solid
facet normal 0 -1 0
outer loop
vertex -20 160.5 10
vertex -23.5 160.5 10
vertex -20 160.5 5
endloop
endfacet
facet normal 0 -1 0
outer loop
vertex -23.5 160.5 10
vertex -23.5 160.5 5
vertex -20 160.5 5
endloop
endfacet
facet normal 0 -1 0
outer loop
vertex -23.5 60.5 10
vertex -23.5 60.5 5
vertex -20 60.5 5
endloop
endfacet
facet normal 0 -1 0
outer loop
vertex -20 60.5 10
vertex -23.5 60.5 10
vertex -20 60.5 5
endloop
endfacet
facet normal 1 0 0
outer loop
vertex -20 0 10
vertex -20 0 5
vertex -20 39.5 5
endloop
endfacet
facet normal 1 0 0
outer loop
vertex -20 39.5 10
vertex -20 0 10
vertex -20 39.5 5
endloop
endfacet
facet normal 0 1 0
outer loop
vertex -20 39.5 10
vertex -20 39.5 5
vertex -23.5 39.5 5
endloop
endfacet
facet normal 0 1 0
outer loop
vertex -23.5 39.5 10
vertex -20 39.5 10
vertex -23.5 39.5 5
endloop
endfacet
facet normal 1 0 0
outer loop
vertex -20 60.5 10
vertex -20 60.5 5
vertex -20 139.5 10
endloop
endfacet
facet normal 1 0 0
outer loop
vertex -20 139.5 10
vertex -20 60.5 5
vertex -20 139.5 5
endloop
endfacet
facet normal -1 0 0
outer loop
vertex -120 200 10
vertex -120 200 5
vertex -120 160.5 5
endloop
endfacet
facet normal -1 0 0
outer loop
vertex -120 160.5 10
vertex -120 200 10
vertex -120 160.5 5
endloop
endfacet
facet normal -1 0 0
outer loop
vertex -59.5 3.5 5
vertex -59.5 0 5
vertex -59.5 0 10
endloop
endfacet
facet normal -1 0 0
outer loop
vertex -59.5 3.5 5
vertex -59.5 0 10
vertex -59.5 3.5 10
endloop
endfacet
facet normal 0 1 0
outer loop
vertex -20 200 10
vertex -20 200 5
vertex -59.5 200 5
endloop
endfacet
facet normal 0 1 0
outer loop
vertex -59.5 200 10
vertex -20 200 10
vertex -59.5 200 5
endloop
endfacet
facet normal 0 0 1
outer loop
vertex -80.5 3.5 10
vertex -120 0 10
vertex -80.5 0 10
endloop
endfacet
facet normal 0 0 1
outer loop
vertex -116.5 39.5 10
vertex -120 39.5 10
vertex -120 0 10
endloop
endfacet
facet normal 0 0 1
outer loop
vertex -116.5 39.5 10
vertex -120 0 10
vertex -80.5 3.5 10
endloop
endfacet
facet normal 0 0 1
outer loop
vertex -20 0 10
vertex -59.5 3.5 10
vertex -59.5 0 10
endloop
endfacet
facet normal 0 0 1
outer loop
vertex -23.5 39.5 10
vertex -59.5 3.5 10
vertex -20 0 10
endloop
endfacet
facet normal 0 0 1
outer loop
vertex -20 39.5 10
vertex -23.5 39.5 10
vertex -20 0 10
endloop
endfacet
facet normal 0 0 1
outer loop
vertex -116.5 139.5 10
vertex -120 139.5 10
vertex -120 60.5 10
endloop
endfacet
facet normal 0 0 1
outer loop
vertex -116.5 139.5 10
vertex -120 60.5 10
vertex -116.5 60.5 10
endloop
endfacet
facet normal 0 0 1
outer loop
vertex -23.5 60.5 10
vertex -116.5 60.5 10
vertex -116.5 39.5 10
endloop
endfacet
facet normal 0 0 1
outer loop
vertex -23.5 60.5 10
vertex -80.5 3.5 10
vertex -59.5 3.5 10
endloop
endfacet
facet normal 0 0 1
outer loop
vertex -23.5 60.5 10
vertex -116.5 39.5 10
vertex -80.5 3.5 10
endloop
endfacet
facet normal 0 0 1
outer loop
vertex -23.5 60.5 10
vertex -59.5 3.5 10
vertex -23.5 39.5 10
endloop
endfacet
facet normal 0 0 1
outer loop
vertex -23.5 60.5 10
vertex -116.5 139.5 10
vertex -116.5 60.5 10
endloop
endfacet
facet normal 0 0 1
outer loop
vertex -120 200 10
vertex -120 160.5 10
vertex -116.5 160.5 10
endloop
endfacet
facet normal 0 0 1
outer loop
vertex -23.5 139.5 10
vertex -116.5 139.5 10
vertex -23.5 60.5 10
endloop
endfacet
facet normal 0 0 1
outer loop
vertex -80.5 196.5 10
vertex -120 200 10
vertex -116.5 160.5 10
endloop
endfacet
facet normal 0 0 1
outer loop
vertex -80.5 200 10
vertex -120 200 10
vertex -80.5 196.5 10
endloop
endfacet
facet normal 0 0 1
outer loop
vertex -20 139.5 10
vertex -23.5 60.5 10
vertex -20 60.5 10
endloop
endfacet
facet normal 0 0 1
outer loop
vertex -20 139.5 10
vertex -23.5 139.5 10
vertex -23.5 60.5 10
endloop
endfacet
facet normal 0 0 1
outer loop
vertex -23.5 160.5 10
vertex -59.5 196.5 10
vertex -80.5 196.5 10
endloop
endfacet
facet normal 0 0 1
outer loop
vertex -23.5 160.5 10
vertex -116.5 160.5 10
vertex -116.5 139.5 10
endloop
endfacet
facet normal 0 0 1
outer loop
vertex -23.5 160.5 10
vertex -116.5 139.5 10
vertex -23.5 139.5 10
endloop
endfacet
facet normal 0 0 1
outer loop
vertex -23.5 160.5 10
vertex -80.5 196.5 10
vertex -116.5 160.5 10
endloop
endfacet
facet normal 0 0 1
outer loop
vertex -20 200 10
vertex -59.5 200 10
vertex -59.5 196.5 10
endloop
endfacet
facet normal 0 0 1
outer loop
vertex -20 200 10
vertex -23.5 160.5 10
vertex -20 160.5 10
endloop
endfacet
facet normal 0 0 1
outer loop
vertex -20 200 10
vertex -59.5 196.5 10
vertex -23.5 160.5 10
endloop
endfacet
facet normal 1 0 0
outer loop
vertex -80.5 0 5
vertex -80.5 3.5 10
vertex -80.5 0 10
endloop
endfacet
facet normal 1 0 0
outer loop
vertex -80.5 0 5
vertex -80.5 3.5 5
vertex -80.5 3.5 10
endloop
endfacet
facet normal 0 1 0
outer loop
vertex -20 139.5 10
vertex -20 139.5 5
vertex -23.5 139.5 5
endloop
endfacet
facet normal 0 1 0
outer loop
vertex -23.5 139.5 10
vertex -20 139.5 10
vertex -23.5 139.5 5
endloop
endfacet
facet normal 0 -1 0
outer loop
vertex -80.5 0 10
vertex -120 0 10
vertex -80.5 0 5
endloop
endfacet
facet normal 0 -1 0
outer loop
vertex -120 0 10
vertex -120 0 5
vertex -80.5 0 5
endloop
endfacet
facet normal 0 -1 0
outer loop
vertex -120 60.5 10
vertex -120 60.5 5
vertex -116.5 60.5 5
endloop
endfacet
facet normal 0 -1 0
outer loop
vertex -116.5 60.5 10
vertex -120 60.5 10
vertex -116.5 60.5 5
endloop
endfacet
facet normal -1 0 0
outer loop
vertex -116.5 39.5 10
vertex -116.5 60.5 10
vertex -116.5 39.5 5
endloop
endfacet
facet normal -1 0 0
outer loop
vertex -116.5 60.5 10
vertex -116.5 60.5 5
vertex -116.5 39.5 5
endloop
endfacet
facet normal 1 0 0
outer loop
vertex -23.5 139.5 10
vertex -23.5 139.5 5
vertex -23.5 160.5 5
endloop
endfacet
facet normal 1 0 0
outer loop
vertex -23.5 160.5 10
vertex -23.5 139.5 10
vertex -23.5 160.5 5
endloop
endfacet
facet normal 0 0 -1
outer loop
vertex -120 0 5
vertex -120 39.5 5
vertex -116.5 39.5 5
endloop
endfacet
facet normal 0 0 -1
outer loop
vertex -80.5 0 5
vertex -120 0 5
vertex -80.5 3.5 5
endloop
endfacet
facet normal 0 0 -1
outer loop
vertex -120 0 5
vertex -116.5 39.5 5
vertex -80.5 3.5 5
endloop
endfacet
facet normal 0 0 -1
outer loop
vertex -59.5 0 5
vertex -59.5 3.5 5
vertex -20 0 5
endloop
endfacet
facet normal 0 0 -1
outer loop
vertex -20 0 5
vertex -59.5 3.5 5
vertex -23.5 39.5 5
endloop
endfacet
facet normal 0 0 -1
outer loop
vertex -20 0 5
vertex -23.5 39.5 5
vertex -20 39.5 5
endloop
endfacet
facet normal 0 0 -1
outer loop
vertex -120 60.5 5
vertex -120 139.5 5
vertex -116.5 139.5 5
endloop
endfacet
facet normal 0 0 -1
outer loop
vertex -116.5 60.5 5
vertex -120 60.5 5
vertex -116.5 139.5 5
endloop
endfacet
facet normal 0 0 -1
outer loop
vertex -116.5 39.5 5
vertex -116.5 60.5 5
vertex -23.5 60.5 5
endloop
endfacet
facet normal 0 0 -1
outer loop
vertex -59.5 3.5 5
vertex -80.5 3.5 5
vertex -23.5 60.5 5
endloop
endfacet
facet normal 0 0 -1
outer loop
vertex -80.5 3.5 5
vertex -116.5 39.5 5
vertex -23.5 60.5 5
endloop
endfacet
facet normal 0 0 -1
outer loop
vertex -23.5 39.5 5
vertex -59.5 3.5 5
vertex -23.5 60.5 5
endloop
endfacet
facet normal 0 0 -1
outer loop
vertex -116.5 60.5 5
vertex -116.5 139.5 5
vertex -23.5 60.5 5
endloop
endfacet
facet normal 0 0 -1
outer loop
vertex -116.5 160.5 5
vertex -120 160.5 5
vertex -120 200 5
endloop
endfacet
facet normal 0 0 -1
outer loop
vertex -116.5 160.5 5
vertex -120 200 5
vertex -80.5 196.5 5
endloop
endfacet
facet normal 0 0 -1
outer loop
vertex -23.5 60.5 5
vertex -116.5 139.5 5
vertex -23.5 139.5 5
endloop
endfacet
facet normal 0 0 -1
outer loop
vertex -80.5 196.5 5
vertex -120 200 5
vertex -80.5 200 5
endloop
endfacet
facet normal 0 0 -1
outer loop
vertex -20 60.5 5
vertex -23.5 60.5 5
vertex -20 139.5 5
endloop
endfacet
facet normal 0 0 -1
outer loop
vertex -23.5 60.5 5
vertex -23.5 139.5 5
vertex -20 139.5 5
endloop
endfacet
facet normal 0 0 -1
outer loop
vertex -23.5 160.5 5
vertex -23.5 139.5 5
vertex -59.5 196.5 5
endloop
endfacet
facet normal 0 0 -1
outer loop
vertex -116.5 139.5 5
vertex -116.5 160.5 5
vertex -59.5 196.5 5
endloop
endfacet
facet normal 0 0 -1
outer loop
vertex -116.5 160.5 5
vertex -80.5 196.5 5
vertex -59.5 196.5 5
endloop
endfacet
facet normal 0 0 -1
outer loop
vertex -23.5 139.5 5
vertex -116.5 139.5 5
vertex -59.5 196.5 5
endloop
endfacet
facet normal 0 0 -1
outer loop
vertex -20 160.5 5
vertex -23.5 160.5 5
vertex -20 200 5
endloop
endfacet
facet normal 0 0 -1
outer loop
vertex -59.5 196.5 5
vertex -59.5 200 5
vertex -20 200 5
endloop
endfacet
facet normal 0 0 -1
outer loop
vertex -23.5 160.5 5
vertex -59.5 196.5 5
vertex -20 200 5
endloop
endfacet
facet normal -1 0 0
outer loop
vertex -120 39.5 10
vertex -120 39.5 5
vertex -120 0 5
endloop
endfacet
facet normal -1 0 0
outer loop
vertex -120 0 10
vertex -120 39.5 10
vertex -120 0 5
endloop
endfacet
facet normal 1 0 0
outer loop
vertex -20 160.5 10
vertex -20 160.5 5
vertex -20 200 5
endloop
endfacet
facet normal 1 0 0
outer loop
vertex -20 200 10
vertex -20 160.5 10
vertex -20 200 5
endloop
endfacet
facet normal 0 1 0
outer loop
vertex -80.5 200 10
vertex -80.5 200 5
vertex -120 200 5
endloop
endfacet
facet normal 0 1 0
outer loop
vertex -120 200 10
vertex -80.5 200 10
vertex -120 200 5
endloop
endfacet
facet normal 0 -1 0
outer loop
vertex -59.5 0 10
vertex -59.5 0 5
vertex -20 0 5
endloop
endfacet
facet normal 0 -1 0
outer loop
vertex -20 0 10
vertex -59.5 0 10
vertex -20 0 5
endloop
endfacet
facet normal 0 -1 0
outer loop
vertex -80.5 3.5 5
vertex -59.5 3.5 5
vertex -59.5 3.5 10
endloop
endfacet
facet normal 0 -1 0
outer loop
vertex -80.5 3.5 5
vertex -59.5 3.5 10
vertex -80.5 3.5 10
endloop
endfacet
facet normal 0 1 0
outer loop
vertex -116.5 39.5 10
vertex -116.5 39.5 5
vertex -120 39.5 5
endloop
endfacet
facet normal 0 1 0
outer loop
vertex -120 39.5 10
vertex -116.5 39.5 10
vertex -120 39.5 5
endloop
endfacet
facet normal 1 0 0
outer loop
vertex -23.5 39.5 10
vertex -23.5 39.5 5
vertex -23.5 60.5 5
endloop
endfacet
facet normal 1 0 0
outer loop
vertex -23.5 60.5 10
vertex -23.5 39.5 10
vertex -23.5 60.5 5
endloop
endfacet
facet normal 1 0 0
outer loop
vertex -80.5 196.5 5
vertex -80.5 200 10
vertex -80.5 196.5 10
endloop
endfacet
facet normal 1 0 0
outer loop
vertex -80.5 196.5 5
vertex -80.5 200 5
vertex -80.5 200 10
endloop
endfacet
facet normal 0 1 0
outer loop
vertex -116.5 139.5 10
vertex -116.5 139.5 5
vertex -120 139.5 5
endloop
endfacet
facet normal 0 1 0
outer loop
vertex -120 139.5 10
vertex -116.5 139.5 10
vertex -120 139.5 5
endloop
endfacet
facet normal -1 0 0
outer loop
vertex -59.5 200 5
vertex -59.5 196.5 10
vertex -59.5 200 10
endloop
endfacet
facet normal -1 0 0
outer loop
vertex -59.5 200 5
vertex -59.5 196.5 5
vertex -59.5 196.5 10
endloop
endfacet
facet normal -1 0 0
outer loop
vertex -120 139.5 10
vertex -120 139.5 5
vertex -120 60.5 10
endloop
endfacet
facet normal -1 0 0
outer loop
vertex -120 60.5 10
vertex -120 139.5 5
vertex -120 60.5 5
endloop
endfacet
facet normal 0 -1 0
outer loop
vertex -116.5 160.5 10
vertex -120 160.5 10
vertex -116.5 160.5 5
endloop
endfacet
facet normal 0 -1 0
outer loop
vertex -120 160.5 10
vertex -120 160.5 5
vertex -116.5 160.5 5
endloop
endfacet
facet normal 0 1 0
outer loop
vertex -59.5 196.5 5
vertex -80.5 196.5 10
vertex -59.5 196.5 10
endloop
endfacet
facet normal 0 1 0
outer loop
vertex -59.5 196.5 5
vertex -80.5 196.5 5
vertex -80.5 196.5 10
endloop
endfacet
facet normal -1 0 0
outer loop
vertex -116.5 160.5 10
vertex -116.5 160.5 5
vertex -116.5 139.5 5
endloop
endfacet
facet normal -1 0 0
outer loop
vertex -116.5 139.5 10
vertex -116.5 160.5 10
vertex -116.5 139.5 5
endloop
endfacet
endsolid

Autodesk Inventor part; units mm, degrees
ref_plane "YZ Plane" through (0, 0, 0) normal (1, 0, 0) x (0, 1, 0)
ref_plane "XZ Plane" through (0, 0, 0) normal (0, 1, 0) x (-1, 0, 0)
ref_plane "XY Plane" through (0, 0, 0) normal (0, 0, 1) x (1, 0, 0)
sketch "Skizze3" plane through (0, 0, 0) normal (0, 0, 1) x (1, 0, 0)
  line L0 (0, 0) -> (0, 200)
  line L1 (0, 200) -> (-20, 200)
  line L2 (-20, 200) -> (-20, 220)
  line L3 (-20, 220) -> (-120, 220)
  line L4 (-120, 220) -> (-120, 200)
  line L5 (-120, 200) -> (-140, 200)
  line L6 (-140, 200) -> (-140, 160)
  line L7 (-140, 160) -> (-120, 160)
  line L8 (-120, 160) -> (-120, 140)
  line L9 (-120, 140) -> (-140, 140)
  line L10 (-140, 140) -> (-140, 160)
  line L11 (-140, 160) -> (-360, 160)
  line L12 (-360, 160) -> (-360, 140)
  line L13 (-360, 140) -> (-380, 140)
  line L14 (-380, 140) -> (-380, 60)
  line L15 (-380, 60) -> (-360, 60)
  line L16 (-360, 60) -> (-360, 40)
  line L17 (-360, 40) -> (-140, 40)
  line L18 (-140, 40) -> (-140, 60)
  line L19 (-140, 60) -> (-120, 60)
  line L20 (-120, 60) -> (-120, 40)
  line L21 (-120, 40) -> (-140, 40)
  line L22 (-140, 40) -> (-140, 0)
  line L23 (-140, 0) -> (-120, 0)
  line L24 (-120, 0) -> (-120, -20)
  line L25 (-120, -20) -> (-20, -20)
  line L26 (-20, -20) -> (-20, 0)
  line L27 (-20, 0) -> (0, 0)
  dimension "d4" = 200
  dimension "d5" = 20
  dimension "d6" = 20
  dimension "d7" = 100
  dimension "d8" = 20
  dimension "d9" = 20
  dimension "d10" = 20
  dimension "d11" = 40
  dimension "d12" = 220
  dimension "d13" = 20
  dimension "d14" = 20
  dimension "d15" = 220
  dimension "d16" = 80
  dimension "d17" = 20
  dimension "d18" = 20
  dimension "d19" = 20
  dimension "d20" = 100
  dimension "d21" = 20
  dimension "d22" = 20
  dimension "d23" = 40
ref_plane "Arbeitsebene1" through (0, 0, 5) normal (0, 0, 1) x (1, 0, 0)
sketch "Skizze4" plane through (0, 0, 5) normal (0, 0, 1) x (1, 0, 0)
  line L0 (-20, 0) -> (-20, 200)
  line L1 (-20, 200) -> (-120, 200)
  line L2 (-120, 200) -> (-120, 0)
  line L3 (-120, 0) -> (-20, 0)
  line L4 (-59.5, 0) -> (-59.5, 3.5)
  line L5 (-59.5, 3.5) -> (-80.5, 3.5)
  line L6 (-80.5, 3.5) -> (-80.5, 0)
  line L7 (-20, 39.5) -> (-23.5, 39.5)
  line L8 (-23.5, 39.5) -> (-23.5, 60.5)
  line L9 (-23.5, 60.5) -> (-20, 60.5)
  point P0 (0, 0)
  point P1 (-23.5, 50)
  dimension "d26" = 3.5
  dimension "d27" = 39.5
  dimension "d28" = 21
  dimension "d29" = 39.5
  dimension "d36" = 3.5
  dimension "d37" = 21
  dimension "d38" = 39.5
extrude "Extrusion5" add sketch "Skizze4" along normal blind 5
ref_plane "Arbeitsebene2" through (-70, 0, 10) normal (1, 0, 0) x (0, 1, 0)
ref_plane "Arbeitsebene3" through (-120, 100, 10) normal (0, -1, 0) x (1, 0, 0)
extrude "Extrusion6" cut sketch "Skizze4" along normal blind 5 contours L7 L8 L9 L0 | L3 L6 L5 L4
mirror "Spiegeln1" about plane through (-70, 0, 10) normal (1, 0, 0) of "Extrusion6"
mirror "Spiegeln2" about plane through (-120, 100, 10) normal (0, -1, 0) of "Extrusion6", "Spiegeln1"
equation "\"d36\" = d26"
equation "\"d37\" = d28"
equation "\"d38\" = d27"
properties part number "BT003_trajan20_21"
